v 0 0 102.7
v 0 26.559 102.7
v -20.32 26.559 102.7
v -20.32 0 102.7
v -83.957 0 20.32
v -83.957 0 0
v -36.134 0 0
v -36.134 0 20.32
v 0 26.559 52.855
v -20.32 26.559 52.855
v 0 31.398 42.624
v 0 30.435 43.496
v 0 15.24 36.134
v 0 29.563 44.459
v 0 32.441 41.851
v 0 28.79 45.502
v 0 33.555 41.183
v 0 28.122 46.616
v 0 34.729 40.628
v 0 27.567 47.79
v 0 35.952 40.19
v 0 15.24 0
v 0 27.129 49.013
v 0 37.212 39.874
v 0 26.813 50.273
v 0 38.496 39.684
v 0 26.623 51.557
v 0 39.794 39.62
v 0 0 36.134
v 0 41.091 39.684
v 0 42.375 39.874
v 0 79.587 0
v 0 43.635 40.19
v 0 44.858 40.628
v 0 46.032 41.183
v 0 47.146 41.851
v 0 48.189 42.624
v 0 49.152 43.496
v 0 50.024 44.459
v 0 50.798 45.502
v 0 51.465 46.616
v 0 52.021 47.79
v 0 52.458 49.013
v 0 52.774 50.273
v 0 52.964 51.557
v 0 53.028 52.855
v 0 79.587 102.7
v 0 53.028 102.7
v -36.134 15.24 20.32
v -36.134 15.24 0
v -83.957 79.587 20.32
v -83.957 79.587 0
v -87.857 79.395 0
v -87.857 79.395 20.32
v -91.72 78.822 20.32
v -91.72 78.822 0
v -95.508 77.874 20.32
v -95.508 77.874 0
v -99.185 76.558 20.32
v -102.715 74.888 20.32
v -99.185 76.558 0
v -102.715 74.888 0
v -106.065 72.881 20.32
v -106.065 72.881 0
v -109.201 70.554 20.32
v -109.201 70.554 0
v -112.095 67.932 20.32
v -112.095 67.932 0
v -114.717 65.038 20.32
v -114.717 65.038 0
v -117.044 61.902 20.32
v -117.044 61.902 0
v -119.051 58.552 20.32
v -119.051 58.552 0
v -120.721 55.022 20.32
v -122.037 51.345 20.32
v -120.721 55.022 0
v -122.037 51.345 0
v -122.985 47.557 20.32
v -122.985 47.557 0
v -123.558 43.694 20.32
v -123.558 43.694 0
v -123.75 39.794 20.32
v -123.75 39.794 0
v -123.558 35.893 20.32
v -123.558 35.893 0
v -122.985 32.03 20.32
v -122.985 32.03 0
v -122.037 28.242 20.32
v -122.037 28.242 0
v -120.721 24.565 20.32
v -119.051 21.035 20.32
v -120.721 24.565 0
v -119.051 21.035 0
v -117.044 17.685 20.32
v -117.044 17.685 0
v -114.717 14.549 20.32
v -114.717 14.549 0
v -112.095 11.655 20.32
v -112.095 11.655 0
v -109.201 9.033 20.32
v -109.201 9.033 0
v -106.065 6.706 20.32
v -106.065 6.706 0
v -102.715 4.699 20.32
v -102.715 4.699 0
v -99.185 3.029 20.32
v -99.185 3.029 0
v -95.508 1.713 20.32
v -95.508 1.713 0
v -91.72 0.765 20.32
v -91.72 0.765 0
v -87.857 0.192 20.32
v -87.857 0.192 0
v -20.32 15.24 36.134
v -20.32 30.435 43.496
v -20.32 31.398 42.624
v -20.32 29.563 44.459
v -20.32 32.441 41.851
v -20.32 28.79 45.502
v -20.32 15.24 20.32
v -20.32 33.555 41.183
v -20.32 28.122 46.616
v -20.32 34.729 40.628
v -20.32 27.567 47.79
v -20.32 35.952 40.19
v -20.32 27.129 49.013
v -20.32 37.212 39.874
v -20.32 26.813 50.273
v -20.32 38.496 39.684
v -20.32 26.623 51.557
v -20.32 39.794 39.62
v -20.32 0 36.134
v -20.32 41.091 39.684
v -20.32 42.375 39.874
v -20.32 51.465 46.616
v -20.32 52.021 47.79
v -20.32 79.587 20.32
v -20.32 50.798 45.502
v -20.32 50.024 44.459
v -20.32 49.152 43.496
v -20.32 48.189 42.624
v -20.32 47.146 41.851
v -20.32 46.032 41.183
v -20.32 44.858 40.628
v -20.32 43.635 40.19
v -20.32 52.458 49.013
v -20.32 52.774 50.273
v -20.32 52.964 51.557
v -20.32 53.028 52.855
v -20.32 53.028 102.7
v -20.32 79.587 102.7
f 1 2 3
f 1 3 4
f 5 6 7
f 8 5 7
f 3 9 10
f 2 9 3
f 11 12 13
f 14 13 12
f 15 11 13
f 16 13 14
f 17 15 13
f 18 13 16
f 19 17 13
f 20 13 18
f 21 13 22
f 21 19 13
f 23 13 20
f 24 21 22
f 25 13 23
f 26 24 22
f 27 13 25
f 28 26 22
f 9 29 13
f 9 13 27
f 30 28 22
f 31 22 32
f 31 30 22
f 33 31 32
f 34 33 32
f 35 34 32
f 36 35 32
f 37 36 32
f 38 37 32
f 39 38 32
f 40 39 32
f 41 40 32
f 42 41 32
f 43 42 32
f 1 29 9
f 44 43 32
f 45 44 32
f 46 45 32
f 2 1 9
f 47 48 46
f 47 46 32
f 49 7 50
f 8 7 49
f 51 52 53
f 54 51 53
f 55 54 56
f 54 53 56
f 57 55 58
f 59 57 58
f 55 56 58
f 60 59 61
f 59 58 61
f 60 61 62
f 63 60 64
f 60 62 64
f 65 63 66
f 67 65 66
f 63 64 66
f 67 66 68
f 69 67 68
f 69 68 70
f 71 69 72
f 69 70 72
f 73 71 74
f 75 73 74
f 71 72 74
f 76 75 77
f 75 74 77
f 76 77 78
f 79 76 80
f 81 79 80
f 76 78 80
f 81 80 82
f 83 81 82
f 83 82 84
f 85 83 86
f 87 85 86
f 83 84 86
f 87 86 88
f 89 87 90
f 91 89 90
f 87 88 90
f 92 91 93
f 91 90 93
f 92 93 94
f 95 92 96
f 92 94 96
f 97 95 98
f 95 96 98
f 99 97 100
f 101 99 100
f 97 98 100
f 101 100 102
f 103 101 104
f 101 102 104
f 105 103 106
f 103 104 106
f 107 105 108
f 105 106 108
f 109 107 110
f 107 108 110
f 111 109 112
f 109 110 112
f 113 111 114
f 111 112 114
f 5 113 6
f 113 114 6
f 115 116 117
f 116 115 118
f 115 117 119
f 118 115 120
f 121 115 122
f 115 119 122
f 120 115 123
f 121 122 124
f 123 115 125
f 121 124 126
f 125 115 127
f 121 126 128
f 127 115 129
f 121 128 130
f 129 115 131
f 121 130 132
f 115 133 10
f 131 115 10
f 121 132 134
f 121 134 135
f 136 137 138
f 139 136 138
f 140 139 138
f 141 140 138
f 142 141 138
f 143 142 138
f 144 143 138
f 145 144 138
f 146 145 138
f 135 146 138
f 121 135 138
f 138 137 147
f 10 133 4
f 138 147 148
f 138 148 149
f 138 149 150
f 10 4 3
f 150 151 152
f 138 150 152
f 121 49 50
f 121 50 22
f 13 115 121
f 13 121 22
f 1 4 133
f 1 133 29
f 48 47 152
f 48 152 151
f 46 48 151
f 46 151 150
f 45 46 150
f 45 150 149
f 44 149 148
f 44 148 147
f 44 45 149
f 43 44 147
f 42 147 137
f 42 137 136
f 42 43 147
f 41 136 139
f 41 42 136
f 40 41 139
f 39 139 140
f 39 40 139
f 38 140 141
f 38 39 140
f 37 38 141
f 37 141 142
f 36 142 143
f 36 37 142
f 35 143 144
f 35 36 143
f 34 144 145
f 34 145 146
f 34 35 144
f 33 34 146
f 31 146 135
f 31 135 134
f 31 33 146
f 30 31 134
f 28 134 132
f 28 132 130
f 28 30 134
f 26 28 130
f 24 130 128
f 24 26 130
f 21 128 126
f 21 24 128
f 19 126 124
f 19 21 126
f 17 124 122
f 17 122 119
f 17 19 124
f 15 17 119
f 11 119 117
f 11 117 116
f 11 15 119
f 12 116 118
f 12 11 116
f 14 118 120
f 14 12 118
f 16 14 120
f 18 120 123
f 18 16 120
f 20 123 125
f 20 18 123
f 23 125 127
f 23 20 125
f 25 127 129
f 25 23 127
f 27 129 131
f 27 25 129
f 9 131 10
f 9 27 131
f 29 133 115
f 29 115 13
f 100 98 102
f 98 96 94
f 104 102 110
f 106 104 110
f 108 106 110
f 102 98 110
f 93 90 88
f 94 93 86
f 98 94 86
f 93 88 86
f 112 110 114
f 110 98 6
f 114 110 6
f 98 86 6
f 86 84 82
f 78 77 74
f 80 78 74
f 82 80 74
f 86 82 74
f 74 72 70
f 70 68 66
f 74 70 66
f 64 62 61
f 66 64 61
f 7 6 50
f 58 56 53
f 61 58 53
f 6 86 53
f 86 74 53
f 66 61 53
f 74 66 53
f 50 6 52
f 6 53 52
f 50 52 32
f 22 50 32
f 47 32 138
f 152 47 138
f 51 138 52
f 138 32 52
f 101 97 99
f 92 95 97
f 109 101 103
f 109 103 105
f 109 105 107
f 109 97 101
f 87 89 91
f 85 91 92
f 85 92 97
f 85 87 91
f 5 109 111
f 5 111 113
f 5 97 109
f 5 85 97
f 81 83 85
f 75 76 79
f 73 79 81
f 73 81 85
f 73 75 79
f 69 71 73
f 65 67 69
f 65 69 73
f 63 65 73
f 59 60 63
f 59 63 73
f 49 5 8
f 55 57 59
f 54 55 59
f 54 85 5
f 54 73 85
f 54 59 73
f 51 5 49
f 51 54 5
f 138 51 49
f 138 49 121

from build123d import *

# Parameters (mm, degrees)
F1_DEPTH = 20.32
F3_DEPTH = 20.32
F4_W     = 36.134478
F4_H     = 36.134478
F5_DEPTH = 15.24


with BuildPart() as f1:
    # F0 (on Right) → F1 (new body)
    with BuildSketch(Plane.YZ):
        with BuildLine():
            Line((0, 102.700152), (0, 0))
            Line((0, 0), (79.587111, 0))
            Line((79.587111, 0), (79.587111, 102.700152))
            Line((79.587111, 102.700152), (53.027965, 102.700152))
            Line((53.027965, 102.700152), (53.027965, 52.854609))
            ThreePointArc((53.027965, 52.854609), (39.793556, 39.620199), (26.559146, 52.854609))
            Line((26.559146, 52.854609), (26.559146, 102.700152))
            Line((26.559146, 102.700152), (0, 102.700152))
        make_face()
    extrude(amount=-F1_DEPTH)

    # F2 (on Top) → F3 (join)
    with BuildSketch(Plane.XY):
        with BuildLine():
            Line((-83.956517, 0), (0, 0))
            Line((0, 0), (0, 79.587111))
            Line((0, 79.587111), (-83.956517, 79.587111))
            ThreePointArc((-83.956517, 79.587111), (-123.750073, 39.793556), (-83.956517, 0))
        make_face()
    extrude(amount=F3_DEPTH)

    # F4 (on Front) → F5 (cut)
    with BuildSketch(Plane.XZ):
        with Locations((-18.067239, 18.067239)):
            Rectangle(F4_W, F4_H)
    extrude(amount=-F5_DEPTH, mode=Mode.SUBTRACT)


solid = f1.part
